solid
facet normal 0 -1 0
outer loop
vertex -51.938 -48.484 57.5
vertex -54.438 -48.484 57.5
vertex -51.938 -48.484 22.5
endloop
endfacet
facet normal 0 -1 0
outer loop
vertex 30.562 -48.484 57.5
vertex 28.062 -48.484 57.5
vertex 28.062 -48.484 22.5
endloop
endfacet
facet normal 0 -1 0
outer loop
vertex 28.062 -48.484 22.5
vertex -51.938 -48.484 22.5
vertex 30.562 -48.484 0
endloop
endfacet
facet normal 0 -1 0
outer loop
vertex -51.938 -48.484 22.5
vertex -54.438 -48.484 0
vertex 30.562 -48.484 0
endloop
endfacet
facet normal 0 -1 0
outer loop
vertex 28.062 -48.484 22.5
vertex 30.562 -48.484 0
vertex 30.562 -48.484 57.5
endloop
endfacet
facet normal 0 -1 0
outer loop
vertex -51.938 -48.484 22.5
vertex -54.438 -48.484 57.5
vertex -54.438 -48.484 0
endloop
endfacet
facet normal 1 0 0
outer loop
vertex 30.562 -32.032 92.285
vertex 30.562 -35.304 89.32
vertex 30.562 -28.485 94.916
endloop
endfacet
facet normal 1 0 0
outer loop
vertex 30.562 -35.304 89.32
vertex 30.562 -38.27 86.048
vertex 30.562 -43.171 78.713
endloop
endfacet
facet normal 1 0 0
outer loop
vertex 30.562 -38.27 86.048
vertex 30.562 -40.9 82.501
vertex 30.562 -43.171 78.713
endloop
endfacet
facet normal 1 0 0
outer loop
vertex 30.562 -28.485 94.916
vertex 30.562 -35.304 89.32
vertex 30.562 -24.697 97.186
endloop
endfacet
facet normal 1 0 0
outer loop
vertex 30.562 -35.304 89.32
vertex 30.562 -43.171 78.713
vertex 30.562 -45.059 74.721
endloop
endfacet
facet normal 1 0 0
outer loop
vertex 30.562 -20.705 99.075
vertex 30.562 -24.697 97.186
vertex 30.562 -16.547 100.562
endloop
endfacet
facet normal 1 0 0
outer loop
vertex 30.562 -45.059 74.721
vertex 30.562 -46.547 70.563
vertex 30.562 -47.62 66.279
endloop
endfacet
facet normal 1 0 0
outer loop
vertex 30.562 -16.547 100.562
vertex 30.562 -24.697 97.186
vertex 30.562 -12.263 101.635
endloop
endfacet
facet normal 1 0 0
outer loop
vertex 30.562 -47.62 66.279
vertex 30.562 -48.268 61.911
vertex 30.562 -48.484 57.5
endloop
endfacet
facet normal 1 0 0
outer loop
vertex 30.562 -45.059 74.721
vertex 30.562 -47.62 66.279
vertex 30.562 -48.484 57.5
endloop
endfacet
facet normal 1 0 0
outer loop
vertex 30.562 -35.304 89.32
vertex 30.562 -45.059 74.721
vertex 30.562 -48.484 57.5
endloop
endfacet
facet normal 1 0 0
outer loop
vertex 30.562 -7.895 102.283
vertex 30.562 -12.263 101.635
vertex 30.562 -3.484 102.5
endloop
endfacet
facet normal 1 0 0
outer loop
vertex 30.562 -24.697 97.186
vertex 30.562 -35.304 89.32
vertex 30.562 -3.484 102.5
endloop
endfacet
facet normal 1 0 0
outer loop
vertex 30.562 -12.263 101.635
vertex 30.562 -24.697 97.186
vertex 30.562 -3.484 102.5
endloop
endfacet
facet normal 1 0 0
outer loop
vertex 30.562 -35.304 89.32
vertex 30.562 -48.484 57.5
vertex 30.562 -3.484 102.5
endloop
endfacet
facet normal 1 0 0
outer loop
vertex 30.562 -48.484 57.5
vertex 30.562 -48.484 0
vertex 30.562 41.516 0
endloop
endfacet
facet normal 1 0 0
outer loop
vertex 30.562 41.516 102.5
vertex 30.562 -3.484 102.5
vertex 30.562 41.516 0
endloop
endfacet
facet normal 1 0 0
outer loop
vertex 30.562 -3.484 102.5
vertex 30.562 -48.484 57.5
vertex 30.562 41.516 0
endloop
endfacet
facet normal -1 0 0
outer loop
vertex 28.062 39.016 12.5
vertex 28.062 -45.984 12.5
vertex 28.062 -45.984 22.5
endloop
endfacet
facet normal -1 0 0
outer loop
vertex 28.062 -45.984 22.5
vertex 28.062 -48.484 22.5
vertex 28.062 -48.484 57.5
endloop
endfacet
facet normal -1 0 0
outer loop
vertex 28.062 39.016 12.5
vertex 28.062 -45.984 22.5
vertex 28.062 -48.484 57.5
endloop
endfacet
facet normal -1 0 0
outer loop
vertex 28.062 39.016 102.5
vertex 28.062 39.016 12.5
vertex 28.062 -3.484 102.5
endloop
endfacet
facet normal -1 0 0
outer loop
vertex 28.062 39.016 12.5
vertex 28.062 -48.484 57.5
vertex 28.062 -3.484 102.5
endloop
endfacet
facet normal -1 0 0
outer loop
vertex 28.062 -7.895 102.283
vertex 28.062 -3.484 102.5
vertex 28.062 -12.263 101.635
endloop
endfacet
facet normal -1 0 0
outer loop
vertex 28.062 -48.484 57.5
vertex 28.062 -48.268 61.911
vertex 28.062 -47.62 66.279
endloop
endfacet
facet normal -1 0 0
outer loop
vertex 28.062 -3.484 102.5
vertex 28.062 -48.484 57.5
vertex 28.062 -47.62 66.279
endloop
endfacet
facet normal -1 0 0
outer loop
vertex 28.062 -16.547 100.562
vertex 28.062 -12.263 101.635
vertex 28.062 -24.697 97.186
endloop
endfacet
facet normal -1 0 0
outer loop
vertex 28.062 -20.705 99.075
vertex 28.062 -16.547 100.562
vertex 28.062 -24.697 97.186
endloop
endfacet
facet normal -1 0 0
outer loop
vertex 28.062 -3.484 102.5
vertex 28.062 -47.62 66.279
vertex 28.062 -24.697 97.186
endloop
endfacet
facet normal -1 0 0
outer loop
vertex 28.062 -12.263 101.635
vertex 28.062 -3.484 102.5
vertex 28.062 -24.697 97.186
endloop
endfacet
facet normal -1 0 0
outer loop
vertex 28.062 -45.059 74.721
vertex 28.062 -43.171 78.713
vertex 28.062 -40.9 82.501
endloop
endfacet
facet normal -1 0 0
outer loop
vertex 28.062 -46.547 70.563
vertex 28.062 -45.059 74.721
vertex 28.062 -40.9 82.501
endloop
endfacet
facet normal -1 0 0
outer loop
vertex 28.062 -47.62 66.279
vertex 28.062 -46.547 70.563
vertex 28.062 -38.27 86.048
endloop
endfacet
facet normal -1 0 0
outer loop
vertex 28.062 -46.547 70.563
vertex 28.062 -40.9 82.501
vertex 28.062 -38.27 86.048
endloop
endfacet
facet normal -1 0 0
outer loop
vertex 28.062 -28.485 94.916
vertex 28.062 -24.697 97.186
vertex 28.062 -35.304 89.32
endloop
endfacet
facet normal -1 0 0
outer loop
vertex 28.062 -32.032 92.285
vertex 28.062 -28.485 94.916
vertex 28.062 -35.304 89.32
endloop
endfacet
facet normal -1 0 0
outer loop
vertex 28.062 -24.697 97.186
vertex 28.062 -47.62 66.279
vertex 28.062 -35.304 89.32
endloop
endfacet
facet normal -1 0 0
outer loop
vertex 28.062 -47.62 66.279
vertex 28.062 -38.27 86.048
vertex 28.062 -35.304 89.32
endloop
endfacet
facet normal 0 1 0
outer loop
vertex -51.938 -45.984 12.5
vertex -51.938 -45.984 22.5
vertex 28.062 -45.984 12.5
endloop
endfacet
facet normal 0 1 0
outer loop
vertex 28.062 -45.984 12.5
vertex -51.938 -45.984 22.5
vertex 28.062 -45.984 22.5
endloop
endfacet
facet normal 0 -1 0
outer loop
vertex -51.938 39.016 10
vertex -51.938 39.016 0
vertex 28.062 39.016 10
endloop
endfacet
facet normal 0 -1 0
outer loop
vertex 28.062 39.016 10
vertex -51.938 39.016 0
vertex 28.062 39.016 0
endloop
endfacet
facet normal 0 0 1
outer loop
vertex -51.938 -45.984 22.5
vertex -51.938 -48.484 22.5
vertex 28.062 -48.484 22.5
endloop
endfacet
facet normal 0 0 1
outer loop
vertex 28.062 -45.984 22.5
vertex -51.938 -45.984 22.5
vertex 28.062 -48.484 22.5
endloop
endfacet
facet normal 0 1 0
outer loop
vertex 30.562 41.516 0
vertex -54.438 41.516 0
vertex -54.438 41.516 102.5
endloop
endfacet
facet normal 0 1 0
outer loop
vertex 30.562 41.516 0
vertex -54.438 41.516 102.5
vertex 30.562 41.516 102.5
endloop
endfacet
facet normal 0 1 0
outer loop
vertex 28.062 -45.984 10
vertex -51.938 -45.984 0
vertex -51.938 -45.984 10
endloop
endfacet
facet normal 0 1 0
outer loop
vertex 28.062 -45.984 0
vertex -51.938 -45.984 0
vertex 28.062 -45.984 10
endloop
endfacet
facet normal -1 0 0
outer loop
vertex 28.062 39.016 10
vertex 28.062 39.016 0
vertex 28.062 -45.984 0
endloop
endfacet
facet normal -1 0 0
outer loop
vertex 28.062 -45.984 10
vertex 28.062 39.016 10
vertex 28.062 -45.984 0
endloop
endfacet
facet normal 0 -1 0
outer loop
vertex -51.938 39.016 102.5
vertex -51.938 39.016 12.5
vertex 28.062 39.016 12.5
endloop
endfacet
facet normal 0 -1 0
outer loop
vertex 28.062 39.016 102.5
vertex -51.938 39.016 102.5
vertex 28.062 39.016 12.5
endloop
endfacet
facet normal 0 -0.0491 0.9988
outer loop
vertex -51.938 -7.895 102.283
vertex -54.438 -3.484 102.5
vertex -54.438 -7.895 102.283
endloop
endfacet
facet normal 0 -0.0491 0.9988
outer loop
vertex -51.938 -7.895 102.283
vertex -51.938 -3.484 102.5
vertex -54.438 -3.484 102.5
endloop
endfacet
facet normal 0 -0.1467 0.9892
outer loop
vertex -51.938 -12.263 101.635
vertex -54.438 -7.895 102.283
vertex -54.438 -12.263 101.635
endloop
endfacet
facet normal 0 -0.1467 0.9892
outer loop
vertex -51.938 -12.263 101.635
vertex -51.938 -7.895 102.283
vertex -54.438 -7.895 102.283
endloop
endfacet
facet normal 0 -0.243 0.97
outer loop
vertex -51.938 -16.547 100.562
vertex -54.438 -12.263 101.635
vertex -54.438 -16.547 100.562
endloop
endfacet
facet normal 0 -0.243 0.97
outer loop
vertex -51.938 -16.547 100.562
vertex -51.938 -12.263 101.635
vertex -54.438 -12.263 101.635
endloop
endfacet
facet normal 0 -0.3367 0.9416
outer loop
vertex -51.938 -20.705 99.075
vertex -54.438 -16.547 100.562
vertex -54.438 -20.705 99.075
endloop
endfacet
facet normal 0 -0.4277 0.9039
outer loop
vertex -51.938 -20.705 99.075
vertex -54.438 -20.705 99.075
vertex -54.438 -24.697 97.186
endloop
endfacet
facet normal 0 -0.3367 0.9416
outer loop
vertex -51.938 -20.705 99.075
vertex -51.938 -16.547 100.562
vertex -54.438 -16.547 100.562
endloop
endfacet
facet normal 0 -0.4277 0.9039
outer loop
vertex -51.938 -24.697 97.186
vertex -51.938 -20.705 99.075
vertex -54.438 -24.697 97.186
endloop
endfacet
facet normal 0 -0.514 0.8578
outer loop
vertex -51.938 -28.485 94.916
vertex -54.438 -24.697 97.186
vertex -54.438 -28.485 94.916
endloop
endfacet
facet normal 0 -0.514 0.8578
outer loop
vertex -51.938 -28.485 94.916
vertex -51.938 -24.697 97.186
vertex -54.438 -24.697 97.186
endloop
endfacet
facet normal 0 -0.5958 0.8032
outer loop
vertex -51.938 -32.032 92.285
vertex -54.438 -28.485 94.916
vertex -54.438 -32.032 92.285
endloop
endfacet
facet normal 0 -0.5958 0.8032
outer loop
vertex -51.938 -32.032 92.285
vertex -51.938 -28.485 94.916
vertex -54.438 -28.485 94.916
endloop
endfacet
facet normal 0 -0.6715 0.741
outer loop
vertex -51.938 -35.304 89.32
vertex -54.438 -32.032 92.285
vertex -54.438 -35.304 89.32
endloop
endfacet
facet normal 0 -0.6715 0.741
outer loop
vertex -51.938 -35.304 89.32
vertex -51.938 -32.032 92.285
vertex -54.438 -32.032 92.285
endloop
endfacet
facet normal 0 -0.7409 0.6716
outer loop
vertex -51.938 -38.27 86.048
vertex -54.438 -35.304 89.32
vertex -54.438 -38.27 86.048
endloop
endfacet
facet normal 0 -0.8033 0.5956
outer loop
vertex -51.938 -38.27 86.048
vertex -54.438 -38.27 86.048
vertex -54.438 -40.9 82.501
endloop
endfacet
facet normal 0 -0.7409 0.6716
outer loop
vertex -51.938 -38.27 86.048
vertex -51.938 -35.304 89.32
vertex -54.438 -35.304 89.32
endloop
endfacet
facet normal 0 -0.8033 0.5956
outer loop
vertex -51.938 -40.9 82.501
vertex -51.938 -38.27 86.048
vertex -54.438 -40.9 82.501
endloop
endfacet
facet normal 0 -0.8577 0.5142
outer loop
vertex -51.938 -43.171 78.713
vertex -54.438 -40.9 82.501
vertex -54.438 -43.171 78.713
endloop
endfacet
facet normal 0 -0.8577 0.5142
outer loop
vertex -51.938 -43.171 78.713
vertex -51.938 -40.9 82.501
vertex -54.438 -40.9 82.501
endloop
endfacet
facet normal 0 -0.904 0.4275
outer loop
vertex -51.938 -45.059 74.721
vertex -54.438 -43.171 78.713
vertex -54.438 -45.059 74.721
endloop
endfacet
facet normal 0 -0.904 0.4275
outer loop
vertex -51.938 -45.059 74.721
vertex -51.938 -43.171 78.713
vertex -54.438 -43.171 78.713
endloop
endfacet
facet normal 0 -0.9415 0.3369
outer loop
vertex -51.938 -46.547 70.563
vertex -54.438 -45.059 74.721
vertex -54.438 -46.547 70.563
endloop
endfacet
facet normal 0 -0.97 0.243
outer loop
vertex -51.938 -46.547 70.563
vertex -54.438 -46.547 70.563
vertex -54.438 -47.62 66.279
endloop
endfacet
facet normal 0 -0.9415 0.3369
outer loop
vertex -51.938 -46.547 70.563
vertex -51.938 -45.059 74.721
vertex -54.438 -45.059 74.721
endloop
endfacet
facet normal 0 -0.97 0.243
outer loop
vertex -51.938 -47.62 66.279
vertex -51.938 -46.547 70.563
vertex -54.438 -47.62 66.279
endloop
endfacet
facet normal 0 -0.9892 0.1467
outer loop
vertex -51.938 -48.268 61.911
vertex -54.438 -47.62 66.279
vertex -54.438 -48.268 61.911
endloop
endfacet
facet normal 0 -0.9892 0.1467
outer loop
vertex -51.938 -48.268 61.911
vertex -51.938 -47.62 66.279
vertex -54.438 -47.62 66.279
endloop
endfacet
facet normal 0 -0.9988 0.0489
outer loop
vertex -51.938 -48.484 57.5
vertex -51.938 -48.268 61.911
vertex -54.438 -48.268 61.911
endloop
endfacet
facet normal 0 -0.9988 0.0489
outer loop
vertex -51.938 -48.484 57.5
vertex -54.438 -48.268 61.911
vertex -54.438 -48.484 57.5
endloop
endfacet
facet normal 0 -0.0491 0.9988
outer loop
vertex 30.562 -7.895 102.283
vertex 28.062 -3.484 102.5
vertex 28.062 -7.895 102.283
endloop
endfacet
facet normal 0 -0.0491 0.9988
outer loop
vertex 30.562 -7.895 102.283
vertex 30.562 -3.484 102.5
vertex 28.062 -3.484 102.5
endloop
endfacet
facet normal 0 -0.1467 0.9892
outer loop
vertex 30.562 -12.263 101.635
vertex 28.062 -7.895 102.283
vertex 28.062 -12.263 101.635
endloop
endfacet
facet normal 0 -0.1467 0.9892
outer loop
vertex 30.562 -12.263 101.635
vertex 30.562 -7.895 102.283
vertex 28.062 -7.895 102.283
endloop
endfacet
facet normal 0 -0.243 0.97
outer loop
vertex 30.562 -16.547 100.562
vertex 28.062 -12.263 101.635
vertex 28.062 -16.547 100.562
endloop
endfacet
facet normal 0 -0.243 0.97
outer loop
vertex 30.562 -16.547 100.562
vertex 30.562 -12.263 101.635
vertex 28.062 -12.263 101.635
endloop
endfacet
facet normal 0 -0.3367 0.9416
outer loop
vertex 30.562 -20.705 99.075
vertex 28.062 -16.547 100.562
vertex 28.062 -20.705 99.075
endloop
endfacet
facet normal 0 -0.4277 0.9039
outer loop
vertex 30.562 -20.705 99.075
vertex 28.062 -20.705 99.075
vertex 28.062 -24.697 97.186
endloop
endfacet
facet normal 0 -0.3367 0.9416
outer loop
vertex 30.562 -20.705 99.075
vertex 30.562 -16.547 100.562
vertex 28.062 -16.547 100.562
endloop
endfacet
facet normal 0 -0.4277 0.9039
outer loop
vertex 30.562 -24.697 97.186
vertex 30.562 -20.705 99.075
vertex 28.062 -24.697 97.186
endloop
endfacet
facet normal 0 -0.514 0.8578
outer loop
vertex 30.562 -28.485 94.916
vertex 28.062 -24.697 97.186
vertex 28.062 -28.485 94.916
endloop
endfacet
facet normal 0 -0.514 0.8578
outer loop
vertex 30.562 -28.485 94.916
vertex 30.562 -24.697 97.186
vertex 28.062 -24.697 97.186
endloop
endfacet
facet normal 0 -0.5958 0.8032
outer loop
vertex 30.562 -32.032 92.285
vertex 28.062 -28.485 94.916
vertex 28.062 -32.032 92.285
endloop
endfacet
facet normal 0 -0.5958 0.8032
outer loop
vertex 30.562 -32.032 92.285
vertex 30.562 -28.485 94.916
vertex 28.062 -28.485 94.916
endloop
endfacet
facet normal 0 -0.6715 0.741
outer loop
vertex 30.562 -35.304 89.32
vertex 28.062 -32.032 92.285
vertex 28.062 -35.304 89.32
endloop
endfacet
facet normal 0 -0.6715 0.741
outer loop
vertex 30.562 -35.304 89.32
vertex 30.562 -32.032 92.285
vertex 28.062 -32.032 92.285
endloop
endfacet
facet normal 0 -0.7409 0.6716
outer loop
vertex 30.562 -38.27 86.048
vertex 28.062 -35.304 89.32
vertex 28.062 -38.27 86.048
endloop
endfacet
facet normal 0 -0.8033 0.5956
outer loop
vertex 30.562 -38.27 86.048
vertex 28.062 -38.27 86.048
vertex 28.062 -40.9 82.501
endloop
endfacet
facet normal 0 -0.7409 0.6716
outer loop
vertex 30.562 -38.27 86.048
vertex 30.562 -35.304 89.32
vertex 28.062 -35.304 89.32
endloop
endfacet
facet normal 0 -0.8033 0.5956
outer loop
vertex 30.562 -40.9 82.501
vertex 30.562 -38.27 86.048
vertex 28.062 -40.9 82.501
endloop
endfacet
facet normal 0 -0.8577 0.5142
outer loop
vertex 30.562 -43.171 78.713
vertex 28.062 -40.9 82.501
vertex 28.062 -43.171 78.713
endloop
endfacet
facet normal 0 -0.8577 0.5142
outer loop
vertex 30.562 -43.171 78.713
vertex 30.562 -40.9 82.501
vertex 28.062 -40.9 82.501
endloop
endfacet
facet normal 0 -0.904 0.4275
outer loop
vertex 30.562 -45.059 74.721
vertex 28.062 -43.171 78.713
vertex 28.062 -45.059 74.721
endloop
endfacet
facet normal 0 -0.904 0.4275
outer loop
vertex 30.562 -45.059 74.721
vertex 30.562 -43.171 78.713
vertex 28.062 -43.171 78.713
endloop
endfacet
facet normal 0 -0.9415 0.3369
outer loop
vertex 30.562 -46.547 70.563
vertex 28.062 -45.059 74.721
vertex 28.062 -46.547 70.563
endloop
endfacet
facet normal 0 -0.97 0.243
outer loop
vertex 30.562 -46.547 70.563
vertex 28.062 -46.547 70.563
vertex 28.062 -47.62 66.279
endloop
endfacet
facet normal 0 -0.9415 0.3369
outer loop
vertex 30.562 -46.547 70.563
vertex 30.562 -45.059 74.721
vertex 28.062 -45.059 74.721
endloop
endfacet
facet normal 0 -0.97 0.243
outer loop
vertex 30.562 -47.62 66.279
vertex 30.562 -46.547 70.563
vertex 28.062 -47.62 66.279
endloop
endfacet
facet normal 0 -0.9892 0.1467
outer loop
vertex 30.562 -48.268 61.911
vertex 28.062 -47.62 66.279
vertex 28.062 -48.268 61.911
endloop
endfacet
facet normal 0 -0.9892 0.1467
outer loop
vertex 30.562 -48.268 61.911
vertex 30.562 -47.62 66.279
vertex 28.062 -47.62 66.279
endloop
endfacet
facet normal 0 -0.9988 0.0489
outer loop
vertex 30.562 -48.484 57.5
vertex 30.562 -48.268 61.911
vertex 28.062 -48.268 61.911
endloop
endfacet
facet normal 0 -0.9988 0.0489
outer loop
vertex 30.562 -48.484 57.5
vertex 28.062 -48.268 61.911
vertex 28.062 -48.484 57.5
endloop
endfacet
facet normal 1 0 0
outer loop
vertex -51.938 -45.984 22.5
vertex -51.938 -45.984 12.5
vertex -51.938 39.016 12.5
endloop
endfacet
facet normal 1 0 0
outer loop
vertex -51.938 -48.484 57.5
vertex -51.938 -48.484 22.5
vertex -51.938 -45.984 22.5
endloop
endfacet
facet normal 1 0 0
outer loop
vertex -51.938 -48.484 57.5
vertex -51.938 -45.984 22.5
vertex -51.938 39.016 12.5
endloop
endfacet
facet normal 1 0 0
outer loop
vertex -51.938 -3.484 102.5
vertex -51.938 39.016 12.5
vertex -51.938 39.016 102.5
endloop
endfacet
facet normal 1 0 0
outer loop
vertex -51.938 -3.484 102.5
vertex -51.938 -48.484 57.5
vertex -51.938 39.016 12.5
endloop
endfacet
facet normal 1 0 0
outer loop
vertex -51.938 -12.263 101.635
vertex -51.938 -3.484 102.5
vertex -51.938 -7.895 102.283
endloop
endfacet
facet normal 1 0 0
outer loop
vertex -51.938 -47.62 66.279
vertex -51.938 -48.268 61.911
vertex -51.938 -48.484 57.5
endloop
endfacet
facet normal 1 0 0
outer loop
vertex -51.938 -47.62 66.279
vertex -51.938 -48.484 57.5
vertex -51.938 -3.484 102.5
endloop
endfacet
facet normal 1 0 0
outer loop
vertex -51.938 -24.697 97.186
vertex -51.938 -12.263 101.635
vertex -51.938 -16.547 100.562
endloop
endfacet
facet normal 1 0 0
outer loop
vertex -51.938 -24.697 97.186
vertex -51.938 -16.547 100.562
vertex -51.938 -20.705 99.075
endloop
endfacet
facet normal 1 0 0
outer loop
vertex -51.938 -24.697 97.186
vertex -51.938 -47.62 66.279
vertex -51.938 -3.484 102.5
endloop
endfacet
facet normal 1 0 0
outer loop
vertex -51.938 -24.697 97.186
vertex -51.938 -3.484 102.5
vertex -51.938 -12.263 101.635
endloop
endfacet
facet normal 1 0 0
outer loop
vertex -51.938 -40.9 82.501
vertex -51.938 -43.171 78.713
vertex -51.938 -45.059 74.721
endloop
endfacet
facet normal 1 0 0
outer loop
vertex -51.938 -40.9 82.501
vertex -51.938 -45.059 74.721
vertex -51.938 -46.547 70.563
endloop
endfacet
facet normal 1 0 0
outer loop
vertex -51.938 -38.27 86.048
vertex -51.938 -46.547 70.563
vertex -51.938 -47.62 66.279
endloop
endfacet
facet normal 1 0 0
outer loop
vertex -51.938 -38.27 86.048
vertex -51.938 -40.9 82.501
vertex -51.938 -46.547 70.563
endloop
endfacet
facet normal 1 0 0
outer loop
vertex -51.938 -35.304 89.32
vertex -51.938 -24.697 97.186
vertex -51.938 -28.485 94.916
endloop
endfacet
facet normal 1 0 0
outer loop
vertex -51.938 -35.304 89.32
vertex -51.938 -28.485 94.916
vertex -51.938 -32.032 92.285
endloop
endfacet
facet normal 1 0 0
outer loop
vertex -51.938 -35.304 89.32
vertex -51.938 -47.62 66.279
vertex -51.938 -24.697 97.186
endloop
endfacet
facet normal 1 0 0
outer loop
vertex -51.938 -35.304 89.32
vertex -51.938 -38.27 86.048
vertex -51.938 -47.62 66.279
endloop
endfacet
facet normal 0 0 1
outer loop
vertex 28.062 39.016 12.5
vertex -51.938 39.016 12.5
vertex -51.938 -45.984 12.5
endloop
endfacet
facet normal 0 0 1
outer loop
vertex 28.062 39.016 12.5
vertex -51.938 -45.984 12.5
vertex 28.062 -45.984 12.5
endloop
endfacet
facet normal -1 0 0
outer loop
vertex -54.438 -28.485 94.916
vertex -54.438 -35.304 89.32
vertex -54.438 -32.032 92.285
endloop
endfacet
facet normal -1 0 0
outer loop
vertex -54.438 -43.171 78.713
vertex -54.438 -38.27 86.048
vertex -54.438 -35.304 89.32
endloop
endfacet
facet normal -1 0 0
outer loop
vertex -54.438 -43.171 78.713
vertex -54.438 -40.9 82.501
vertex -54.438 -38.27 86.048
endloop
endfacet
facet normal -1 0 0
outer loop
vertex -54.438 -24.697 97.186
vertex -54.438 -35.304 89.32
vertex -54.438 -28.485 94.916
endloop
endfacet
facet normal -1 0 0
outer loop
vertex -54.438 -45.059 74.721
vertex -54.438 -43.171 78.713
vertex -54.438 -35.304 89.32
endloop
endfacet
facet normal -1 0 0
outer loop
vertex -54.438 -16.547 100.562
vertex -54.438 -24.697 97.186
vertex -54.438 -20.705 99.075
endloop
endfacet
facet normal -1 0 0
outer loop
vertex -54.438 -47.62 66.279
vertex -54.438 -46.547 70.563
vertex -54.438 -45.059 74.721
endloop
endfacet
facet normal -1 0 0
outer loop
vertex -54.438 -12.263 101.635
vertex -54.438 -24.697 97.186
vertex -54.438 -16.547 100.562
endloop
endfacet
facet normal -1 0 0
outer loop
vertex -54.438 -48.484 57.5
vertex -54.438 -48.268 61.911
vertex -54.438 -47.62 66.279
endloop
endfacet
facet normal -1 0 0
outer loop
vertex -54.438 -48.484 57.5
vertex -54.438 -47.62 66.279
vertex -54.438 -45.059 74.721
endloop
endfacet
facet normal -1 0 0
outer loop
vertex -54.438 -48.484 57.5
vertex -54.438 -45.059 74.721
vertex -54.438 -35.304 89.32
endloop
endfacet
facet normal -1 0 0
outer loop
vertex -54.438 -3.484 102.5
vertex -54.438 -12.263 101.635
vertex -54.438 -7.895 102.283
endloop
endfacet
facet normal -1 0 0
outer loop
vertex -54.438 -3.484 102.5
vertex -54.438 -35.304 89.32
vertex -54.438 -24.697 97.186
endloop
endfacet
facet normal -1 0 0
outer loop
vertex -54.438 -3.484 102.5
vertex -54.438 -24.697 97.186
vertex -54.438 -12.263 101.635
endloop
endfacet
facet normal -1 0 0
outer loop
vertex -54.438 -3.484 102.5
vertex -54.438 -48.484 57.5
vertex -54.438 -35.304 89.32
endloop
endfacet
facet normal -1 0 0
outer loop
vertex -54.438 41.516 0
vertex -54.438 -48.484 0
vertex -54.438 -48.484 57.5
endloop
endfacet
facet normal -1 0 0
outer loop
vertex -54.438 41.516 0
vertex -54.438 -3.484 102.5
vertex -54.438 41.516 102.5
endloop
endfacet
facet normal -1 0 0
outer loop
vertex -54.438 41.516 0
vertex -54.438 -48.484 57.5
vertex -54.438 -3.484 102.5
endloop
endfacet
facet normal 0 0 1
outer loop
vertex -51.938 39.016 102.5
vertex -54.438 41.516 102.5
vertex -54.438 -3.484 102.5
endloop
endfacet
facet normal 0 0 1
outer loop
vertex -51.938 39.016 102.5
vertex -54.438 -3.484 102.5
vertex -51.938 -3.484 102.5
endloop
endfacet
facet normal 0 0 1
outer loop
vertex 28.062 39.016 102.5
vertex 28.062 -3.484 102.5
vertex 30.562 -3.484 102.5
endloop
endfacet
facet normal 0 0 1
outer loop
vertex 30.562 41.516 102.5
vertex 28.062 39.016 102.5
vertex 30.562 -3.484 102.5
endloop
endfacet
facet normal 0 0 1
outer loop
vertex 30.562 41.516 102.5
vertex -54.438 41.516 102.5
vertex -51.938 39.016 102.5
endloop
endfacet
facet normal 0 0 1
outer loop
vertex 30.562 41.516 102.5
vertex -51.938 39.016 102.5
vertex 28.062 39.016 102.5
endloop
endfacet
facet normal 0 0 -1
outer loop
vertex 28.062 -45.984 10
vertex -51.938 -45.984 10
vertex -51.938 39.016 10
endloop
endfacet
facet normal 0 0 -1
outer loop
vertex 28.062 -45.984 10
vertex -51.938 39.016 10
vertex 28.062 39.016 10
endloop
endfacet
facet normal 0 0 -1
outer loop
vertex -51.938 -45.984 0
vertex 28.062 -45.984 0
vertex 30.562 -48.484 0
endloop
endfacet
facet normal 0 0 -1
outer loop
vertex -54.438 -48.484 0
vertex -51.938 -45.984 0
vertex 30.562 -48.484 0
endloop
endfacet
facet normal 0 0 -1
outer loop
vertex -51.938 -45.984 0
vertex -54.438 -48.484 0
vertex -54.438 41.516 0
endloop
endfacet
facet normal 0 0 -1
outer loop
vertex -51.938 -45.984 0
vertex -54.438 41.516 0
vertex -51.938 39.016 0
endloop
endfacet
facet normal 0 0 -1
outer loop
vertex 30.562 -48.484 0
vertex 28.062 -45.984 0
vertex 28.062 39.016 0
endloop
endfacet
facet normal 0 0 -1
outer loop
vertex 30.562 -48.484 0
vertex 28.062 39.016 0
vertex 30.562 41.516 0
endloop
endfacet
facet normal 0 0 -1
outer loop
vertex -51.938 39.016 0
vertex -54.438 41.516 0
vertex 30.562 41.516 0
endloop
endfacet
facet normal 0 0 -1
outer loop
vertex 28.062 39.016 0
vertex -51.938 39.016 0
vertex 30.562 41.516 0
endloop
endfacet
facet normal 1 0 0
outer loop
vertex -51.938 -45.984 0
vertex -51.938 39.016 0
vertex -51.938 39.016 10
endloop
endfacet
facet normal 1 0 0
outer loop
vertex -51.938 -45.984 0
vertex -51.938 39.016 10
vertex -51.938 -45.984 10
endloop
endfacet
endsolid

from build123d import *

# Parameters (mm, degrees)
F0_W     = 85
F0_H     = 90
F1_DEPTH = 102.5
F2_W     = 80
F2_H     = 85
F3_DEPTH = 10
F4_W     = 80
F4_H     = 85
F5_DEPTH = 90
F6_W     = 80
F6_H     = 80
F7_DEPTH = 25
F8_R     = 45


with BuildPart() as f1:
    # F0 (on Top) → F1 (new body)
    with BuildSketch(Plane.XY):
        with Locations((-11.937995, -3.484366)):
            Rectangle(F0_W, F0_H)
    extrude(amount=F1_DEPTH)

    # F2 (on face) → F3 (cut)
    with BuildSketch(Plane(origin=(0, 0, 0), x_dir=(1, 0, 0), z_dir=(0, 0, -1))):
        with Locations((-11.937995, 3.484366)):
            Rectangle(F2_W, F2_H)
    extrude(amount=-F3_DEPTH, mode=Mode.SUBTRACT)

    # F4 (on face) → F5 (cut)
    with BuildSketch(Plane.XY.offset(102.5)):
        with Locations((-11.937995, -3.484366)):
            Rectangle(F4_W, F4_H)
    extrude(amount=-F5_DEPTH, mode=Mode.SUBTRACT)

    # F6 (on face) → F7 (cut)
    with BuildSketch(Plane.XZ.offset(48.484366)):
        with Locations((-11.937995, 62.5)):
            Rectangle(F6_W, F6_H)
    extrude(amount=-F7_DEPTH, mode=Mode.SUBTRACT)

    # F8
    f8_edges = [f1.edges().sort_by_distance(p)[0] for p in [
        (-53.187995, -48.484366, 102.5),
        (29.312005, -48.484366, 102.5),
    ]]
    fillet(f8_edges, radius=F8_R)


solid = f1.part
